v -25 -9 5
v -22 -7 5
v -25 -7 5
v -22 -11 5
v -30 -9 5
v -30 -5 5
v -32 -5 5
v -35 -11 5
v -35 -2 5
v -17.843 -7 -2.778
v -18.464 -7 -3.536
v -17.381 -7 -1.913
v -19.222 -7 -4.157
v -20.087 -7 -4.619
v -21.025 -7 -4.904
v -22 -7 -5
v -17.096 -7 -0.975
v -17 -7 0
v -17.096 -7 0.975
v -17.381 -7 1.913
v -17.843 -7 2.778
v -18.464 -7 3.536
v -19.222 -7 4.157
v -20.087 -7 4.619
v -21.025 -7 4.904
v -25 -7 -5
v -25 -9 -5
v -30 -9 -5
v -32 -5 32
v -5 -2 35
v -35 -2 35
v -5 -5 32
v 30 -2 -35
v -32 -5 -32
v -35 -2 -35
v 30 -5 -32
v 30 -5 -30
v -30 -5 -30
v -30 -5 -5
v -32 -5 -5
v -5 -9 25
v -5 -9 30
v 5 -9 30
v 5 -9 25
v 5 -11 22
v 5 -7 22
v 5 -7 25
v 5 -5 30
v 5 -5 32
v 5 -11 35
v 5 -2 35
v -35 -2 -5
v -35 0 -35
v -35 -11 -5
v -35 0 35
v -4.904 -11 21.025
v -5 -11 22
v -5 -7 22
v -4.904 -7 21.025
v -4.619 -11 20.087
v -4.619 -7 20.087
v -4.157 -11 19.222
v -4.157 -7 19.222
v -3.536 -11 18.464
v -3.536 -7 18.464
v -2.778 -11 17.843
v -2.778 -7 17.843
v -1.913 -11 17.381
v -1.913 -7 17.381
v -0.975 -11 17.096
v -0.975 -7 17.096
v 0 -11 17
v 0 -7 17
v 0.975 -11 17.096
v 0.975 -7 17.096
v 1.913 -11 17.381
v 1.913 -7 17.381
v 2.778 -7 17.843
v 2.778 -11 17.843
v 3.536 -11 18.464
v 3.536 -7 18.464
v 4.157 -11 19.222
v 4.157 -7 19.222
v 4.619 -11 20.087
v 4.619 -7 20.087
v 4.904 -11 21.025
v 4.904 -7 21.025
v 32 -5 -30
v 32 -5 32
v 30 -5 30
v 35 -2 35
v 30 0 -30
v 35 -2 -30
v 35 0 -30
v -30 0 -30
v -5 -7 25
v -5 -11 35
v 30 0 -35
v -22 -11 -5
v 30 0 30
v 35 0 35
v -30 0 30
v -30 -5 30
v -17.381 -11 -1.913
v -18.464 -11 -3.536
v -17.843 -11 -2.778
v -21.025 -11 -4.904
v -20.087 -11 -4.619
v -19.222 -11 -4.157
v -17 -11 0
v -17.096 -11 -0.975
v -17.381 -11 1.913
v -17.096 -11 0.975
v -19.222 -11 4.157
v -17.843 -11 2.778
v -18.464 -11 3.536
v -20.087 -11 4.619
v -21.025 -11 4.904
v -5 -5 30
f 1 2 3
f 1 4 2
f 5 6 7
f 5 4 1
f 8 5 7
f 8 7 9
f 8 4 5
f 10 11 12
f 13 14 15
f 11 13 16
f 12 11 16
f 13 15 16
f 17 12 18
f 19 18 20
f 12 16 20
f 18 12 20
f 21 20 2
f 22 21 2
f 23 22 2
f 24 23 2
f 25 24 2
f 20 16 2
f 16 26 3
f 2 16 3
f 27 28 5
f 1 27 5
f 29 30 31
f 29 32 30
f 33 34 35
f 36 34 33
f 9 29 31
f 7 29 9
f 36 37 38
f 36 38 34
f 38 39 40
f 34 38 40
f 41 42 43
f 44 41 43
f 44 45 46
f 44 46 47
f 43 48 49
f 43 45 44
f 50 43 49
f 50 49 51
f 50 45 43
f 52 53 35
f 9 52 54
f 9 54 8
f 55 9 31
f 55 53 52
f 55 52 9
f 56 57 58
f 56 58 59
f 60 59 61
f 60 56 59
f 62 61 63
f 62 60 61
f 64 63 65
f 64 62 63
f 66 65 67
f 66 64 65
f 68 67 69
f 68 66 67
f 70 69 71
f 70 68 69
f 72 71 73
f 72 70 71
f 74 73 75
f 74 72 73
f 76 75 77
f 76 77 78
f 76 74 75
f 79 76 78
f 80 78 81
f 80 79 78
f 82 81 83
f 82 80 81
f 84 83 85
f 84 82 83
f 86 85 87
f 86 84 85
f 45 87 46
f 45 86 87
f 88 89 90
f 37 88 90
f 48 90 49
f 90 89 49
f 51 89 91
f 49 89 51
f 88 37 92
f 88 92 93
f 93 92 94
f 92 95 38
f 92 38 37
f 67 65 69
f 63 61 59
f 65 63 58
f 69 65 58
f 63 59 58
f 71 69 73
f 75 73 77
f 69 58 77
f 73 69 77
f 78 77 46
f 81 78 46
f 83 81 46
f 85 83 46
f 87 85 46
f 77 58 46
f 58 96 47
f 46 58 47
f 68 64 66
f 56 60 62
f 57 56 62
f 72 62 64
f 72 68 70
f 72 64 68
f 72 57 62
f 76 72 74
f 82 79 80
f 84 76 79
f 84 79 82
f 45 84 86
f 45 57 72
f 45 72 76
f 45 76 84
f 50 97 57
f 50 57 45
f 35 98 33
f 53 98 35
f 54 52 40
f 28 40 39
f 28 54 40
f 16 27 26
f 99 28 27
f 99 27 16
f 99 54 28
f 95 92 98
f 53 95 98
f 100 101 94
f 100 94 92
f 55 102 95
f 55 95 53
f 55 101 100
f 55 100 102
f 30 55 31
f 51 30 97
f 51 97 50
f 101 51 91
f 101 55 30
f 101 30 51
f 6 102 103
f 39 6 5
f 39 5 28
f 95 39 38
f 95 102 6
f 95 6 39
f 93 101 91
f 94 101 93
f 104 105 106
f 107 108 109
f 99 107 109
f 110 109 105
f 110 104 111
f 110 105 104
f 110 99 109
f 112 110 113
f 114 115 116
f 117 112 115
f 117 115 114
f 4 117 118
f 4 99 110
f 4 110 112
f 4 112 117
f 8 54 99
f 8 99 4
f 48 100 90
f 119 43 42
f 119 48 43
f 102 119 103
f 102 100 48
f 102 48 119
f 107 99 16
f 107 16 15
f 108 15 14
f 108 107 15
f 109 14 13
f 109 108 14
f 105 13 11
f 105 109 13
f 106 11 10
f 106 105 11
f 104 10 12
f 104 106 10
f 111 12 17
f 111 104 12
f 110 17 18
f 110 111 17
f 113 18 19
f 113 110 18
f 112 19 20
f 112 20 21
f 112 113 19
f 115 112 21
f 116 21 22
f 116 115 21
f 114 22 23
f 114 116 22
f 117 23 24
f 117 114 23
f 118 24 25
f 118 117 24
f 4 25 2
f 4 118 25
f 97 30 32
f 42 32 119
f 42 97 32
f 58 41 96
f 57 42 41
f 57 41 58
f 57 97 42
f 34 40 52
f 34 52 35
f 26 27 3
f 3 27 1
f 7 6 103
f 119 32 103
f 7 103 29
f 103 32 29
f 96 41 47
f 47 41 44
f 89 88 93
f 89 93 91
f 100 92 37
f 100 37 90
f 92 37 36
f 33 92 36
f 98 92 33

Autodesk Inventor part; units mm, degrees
sketch "Sketch1" plane through (0, 0, 0) normal (0, 1, 0) x (-1, 0, 0)
  line L0 (30, -30) -> (-30, -30)
  line L1 (-30, -30) -> (-30, 30)
  line L2 (-30, 30) -> (30, 30)
  line L3 (30, 30) -> (30, -30)
  line L4 (0, -49.175) -> (0, 49.175) projected
  line L5 (-49, 0) -> (49, 0) projected
  line L6 (-35, -35) -> (35, -35)
  line L7 (35, -35) -> (35, 35)
  line L8 (35, 35) -> (-35, 35)
  line L9 (-35, 35) -> (-35, -35)
  line L10 (-30, -30) -> (-30, -35)
  line L11 (-30, -30) -> (-35, -30)
  line L12 (-32, -32) -> (32, -32)
  line L13 (32, -32) -> (32, 32)
  line L14 (32, 32) -> (-32, 32)
  line L15 (-32, 32) -> (-32, -32)
  point P0 (0, 0)
  point P1 (0, -30)
  point P2 (30, 0)
  point P3 (-30, -32)
  point P4 (-32, -30)
  dimension "d0" = 60
  dimension "d1" = 60
  dimension "d2" = 5
  dimension "d3" = 2
extrude "Extrusion1" add sketch "Sketch1" against normal blind 2 contours L12 L13 L5 L7 L6 L4 | L4 L6 L10 L12 | L13 L14 L4 L8 L7 L5 | L11 L9 L5 L15 | L5 L9 L8 L4 L14 L15
extrude "Extrusion2" add sketch "Sketch1" against normal blind 5 contours L3 L5 L13 L12 L4 L0 | L4 L12 L10 L0 | L3 L2 L4 L14 L13 L5 | L11 L15 L5 L1 | L5 L15 L14 L4 L2 L1
chamfer "Chamfer1" distance 3 angle 45 4 edges at (0, -2, 32) (32, -2, 1) (-1, -2, -32) (-32, -2, 0)
sketch "Sketch2" plane through (0, 0, 0) normal (0, 1, 0) x (1, 0, 0)
  line L0 (-30, -30) -> (30, -30) projected
  line L1 (-35, -35) -> (35, -35) projected
  line L2 (-5, -30) -> (5, -30)
  line L3 (5, -30) -> (5, -35)
  line L4 (5, -35) -> (-5, -35)
  line L5 (-5, -35) -> (-5, -30)
  line L6 (0, 49.025) -> (0, -49.15) projected
  point P0 (0, 0)
  point P1 (0, -35)
  dimension "d11" = 10
extrude "Extrusion3" add sketch "Sketch2" against normal blind 11
sketch "Sketch3" plane through (0, -11, 0) normal (0, -1, 0) x (1, 0, 0)
  line L0 (5, 30) -> (30, 30) projected
  line L1 (5, 30) -> (-5, 30)
  line L2 (-5, 30) -> (-5, 25)
  line L3 (-5, 25) -> (5, 25)
  line L4 (5, 25) -> (5, 30)
  line L5 (-5, 25) -> (5, 25)
  line L6 (5, 25) -> (5, 22)
  line L7 (5, 22) -> (-5, 22)
  line L8 (-5, 22) -> (-5, 25)
  arc A0 (-5, 22) -> (5, 22) centre (0, 22) ccw
  point P0 (0, 0)
  point P1 (5, 25)
  dimension "d14" = 10
  dimension "d15" = 5
  dimension "d16" = 10
  dimension "d17" = 3
extrude "Extrusion4" add sketch "Sketch3" against normal blind 2 contours L4 L3 L2 L1
extrude "Extrusion5" add sketch "Sketch3" against normal blind 4 contours L6 L7 L8 L3 | A0 L7
pattern_circular "Circular Pattern1" count 2 over 90 about axis through (0, -10, 0) along (0, -1, 0) of "Extrusion3", "Extrusion4", "Extrusion5"
properties part number "Marker_Edge"
